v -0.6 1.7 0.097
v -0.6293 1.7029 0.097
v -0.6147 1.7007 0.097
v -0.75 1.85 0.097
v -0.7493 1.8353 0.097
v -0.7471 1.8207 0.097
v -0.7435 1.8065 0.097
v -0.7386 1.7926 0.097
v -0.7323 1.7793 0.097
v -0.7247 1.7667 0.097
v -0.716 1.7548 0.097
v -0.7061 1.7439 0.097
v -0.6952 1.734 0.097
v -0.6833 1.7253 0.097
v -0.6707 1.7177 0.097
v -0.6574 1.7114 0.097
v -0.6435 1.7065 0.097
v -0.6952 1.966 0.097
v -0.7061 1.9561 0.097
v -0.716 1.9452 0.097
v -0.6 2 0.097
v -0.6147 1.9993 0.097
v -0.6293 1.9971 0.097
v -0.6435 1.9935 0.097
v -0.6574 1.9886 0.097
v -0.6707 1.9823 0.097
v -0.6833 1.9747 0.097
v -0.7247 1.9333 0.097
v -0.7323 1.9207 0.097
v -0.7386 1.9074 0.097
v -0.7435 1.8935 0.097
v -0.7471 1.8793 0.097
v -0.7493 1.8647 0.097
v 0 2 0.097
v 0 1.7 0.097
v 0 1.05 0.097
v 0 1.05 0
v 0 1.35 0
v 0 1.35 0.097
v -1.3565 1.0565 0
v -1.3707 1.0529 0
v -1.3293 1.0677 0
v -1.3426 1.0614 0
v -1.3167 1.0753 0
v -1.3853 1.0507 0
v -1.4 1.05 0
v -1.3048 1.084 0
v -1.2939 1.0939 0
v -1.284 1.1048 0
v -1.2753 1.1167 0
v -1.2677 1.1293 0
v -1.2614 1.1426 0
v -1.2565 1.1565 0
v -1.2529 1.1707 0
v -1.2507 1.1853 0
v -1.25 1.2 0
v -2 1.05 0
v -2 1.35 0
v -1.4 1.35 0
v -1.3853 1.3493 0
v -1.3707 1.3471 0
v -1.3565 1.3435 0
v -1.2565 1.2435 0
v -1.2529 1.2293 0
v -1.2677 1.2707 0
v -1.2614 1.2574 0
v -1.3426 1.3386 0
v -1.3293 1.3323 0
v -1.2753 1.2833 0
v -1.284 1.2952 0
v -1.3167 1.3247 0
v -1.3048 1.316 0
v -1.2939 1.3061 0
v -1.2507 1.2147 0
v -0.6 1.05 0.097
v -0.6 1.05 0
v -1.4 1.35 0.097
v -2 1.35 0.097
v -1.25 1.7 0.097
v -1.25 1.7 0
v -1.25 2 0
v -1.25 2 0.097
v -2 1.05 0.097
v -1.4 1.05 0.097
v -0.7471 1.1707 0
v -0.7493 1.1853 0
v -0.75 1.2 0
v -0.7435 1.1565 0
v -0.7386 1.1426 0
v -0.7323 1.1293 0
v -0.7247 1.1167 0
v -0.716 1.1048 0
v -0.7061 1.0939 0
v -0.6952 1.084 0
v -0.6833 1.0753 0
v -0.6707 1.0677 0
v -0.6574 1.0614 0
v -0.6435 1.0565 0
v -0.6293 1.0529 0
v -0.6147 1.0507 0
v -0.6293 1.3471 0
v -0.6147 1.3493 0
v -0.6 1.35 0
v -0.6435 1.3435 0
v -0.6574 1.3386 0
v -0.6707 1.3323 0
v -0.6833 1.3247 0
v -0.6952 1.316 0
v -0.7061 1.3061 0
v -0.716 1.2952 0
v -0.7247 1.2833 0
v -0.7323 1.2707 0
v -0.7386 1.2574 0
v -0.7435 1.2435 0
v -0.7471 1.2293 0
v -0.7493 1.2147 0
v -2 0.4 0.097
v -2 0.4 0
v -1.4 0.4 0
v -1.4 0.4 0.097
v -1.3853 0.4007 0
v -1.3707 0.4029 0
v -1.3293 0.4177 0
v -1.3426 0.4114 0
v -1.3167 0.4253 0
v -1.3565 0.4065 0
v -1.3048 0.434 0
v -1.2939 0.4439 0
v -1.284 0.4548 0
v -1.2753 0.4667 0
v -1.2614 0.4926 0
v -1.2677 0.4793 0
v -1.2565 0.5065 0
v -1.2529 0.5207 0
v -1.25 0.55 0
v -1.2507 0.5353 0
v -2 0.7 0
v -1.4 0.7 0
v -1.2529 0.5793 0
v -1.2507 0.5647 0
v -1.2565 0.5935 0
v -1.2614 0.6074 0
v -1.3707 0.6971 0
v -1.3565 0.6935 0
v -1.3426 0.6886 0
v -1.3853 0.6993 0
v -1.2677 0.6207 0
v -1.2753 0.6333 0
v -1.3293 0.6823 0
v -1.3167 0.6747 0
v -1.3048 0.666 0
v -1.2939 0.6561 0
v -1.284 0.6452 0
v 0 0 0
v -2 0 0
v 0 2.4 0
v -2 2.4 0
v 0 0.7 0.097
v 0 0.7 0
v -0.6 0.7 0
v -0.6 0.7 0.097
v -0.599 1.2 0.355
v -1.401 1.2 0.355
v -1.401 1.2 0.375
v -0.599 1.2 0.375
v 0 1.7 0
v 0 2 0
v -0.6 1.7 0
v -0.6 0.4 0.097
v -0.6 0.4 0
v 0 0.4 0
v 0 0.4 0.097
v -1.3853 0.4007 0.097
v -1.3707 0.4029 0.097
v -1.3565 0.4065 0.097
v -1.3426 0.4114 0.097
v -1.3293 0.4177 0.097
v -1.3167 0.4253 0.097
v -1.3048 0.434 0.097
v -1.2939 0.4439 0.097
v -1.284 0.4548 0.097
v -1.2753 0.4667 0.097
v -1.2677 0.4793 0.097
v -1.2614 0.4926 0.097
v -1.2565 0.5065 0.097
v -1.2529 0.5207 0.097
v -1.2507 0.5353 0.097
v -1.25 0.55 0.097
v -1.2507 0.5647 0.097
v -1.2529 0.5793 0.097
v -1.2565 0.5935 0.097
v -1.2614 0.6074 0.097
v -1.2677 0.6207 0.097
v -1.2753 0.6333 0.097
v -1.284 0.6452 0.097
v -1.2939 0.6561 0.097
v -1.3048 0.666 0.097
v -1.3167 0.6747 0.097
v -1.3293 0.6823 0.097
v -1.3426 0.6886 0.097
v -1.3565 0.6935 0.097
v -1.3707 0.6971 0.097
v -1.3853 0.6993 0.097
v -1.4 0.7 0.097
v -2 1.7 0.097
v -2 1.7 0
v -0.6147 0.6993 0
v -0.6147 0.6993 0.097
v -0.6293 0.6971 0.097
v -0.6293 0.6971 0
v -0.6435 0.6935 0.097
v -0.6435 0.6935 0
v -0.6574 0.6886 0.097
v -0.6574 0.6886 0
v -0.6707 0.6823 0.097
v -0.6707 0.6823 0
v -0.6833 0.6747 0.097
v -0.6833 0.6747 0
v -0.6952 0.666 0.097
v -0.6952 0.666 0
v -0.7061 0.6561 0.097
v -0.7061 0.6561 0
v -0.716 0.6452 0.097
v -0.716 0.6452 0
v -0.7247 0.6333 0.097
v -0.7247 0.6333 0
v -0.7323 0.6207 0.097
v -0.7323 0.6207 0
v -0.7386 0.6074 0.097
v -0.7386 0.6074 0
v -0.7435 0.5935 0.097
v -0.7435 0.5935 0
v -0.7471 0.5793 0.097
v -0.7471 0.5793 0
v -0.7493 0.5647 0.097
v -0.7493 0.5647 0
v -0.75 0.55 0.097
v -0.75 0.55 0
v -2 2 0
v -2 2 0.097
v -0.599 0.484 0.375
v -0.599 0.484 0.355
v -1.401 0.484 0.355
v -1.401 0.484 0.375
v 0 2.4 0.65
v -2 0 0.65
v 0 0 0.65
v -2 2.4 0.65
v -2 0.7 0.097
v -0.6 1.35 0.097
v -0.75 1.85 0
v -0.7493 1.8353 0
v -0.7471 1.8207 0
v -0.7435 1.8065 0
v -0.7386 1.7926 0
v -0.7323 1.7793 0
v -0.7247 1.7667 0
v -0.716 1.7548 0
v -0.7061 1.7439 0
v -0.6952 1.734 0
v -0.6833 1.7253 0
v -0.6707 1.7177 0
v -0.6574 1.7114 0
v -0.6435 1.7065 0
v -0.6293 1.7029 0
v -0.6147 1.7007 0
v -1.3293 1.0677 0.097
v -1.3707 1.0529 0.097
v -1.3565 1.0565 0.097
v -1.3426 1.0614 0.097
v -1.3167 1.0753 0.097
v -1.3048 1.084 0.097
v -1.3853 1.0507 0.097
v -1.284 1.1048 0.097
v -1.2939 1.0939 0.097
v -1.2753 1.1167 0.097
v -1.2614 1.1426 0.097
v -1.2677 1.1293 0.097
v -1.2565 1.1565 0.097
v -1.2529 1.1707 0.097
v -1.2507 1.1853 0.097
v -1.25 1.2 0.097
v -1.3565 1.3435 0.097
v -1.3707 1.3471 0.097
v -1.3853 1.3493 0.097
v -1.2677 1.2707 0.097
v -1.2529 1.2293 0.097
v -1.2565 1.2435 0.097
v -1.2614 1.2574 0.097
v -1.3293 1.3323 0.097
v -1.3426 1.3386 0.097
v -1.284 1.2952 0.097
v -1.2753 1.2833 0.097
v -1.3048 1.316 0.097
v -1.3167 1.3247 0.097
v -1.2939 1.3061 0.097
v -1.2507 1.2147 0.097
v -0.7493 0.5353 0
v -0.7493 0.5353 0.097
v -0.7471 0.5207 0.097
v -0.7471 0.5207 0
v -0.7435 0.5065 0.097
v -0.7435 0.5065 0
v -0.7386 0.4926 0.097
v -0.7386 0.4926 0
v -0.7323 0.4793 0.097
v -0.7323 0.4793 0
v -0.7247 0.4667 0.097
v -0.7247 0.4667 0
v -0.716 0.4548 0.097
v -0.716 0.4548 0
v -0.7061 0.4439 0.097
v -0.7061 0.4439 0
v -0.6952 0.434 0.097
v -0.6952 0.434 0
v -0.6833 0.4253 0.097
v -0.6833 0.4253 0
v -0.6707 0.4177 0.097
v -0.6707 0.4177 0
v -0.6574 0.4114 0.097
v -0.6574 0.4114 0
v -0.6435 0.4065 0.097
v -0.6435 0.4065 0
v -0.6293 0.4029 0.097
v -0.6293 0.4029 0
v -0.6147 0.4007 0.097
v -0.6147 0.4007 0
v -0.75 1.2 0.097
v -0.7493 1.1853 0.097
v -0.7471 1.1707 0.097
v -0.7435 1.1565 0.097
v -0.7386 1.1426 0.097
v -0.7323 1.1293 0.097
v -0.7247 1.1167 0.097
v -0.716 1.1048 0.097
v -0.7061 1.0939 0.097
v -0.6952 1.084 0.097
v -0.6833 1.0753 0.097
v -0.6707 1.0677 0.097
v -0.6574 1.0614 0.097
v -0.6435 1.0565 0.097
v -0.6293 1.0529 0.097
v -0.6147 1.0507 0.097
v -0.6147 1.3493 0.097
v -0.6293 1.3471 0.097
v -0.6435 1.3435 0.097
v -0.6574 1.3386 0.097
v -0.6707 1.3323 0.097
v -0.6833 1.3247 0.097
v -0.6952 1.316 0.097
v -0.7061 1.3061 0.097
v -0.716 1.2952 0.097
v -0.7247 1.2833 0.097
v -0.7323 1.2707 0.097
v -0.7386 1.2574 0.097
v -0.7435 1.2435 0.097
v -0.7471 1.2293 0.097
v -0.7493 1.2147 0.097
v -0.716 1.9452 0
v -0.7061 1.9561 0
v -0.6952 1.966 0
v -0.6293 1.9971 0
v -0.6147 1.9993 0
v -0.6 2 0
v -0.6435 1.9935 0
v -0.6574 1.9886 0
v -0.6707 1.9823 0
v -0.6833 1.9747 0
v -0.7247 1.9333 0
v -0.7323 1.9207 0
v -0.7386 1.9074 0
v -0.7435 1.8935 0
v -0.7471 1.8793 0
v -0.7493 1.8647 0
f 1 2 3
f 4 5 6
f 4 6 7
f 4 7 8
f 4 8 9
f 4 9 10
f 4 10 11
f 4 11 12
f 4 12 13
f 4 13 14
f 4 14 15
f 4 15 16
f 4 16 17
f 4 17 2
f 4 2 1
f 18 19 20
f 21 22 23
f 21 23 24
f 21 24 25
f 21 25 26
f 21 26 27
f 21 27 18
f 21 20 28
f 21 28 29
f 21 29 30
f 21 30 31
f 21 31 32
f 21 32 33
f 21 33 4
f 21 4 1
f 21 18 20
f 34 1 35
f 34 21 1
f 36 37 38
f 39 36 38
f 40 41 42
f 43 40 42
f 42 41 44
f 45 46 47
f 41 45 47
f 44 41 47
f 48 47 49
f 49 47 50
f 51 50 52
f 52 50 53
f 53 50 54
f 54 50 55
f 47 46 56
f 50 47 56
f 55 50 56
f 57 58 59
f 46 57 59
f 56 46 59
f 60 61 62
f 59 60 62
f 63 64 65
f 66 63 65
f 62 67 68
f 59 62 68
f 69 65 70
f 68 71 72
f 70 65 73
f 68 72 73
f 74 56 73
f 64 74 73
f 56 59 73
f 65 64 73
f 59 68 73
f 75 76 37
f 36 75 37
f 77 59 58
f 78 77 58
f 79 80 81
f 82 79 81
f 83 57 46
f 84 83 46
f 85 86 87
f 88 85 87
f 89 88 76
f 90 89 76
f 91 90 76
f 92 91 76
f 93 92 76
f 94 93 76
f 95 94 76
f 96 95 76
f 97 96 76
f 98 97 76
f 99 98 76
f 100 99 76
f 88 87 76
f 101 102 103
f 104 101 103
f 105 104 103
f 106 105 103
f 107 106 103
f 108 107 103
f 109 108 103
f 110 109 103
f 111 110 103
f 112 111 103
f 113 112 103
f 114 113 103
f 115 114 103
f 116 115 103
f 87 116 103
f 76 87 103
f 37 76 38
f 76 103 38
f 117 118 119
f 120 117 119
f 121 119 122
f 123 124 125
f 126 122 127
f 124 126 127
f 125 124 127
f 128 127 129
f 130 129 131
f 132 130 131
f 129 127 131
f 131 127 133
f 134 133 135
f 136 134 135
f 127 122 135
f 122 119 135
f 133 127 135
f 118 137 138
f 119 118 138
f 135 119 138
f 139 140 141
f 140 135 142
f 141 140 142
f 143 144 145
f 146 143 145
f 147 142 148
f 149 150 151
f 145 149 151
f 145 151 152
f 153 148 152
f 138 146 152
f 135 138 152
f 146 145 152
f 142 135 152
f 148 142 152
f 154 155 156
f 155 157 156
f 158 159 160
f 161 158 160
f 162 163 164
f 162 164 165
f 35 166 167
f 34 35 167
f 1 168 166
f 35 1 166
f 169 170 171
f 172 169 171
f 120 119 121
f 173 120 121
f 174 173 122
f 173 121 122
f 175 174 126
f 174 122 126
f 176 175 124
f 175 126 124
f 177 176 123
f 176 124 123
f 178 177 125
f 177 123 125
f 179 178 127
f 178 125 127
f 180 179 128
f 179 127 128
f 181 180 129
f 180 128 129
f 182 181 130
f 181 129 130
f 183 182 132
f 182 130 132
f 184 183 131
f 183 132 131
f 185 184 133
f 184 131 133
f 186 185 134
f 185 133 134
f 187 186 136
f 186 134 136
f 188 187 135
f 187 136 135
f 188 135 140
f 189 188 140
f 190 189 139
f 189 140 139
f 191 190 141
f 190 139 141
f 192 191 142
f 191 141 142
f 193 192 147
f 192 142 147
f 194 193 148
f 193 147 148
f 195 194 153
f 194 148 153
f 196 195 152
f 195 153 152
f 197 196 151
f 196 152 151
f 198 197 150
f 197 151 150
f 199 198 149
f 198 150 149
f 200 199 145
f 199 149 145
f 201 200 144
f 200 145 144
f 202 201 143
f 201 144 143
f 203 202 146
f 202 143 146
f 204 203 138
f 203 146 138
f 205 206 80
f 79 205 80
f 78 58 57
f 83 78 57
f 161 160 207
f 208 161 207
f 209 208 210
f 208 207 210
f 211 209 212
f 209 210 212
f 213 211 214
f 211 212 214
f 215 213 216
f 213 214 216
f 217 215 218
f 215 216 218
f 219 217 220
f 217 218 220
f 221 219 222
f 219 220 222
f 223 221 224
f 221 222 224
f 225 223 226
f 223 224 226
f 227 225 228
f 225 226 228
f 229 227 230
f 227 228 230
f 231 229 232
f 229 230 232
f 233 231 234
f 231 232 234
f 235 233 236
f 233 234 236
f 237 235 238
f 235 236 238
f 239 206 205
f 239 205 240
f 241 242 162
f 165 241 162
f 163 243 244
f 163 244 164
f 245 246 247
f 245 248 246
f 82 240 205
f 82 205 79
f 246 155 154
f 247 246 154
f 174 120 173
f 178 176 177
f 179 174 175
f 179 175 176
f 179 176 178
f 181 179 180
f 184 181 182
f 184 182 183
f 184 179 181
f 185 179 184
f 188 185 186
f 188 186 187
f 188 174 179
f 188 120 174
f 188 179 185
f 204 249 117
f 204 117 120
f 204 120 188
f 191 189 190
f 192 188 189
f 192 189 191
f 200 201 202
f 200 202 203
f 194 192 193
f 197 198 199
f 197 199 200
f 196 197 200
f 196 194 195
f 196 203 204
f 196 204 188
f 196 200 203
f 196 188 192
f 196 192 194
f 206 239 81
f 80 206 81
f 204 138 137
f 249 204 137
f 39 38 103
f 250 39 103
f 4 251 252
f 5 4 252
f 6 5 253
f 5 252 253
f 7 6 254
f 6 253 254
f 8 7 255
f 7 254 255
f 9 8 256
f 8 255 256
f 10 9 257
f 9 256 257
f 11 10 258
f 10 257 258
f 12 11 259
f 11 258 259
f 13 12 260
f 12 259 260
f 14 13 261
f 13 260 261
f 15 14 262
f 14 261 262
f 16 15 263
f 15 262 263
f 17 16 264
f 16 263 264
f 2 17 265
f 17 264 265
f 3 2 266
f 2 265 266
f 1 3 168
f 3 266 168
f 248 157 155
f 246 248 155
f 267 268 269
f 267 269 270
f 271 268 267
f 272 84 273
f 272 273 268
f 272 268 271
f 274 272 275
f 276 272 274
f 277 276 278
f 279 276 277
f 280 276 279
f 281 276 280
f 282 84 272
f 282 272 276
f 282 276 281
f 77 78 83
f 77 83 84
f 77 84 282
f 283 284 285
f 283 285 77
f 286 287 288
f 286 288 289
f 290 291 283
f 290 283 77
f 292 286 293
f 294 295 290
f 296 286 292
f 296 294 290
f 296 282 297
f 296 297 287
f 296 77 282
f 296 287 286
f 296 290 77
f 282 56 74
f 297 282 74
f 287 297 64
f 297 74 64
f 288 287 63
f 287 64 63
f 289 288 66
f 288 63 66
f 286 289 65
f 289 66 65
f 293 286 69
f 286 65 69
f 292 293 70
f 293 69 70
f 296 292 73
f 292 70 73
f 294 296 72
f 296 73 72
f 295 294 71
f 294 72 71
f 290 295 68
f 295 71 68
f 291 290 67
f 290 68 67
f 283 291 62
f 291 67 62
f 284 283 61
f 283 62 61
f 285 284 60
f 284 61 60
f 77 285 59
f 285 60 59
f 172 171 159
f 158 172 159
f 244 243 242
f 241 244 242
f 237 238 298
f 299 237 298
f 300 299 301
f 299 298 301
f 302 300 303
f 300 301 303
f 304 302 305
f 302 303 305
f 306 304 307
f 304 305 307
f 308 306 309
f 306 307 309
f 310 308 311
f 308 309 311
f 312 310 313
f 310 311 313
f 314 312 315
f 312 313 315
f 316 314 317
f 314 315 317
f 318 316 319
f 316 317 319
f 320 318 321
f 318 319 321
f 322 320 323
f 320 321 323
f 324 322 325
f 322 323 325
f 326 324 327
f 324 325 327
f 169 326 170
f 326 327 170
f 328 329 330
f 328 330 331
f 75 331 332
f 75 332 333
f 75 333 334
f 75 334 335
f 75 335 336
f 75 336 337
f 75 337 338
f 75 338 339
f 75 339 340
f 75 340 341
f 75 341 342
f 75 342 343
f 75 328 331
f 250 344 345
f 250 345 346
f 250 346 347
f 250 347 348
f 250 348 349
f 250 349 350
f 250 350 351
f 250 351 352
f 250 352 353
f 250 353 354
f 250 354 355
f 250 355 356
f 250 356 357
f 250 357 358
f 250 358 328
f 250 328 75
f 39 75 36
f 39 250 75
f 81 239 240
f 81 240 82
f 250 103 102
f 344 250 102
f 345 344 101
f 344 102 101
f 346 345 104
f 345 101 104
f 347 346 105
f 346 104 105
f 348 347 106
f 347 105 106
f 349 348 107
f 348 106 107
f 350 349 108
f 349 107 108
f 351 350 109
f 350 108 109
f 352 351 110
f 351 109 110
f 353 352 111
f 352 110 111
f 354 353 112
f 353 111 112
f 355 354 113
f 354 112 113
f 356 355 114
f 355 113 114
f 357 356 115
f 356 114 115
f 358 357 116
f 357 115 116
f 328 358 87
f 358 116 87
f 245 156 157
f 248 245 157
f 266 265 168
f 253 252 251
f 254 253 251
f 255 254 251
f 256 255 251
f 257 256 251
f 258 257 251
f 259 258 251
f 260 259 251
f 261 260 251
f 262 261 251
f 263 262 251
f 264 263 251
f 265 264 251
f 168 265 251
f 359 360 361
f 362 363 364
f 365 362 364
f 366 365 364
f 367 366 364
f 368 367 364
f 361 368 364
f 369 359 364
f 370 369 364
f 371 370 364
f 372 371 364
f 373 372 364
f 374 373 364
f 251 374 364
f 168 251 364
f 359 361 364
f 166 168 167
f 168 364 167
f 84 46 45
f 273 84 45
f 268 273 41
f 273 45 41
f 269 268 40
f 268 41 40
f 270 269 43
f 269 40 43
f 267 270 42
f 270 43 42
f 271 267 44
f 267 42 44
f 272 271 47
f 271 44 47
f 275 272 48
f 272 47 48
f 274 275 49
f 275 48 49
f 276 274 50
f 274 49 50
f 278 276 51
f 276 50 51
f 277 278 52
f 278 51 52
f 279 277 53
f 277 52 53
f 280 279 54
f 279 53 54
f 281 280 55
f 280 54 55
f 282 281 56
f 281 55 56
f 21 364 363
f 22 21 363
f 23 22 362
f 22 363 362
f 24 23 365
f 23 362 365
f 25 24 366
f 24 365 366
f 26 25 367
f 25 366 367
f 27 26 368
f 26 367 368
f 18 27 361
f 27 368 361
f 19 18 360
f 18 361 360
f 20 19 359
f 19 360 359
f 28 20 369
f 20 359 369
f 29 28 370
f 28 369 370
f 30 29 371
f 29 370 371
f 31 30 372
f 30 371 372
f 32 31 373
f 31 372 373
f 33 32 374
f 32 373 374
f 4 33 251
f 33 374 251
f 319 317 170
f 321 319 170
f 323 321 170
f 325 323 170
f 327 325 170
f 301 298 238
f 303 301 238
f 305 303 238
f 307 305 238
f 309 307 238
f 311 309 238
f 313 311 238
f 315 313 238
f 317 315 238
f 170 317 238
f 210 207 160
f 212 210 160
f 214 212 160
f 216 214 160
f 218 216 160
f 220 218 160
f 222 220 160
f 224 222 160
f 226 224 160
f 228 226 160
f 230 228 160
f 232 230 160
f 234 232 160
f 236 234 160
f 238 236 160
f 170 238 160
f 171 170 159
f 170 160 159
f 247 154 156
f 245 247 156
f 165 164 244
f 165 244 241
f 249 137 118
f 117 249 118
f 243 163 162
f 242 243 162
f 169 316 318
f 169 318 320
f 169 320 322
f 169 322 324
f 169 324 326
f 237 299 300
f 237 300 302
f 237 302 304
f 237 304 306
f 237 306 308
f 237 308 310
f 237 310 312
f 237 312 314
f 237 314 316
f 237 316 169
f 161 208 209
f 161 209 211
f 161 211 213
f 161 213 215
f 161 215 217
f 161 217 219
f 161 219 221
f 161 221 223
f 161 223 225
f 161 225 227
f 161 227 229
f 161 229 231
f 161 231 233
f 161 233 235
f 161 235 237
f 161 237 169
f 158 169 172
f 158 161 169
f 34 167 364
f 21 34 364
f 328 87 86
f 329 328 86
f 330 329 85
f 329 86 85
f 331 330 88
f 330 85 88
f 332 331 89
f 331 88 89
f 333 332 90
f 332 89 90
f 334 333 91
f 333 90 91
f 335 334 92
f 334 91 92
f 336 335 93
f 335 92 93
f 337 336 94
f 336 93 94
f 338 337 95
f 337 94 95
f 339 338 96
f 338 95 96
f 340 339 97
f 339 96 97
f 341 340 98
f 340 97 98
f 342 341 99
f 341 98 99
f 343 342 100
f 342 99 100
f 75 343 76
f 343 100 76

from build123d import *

# Parameters (mm, degrees)
F0_W     = 0.75
F0_H     = 0.3
F1_DEPTH = 0.65
F2_DEPTH = 0.097
F4_W     = 0.802
F4_H     = 0.716
F5_DEPTH = 0.02


with BuildPart() as f1:
    # F0 (on Top) → F1 (new body)
    with BuildSketch(Plane.XY):
        with BuildLine():
            Line((-2, 0), (0, 0))
            Line((0, 0), (0, 0.4))
            Line((0, 0.4), (-0.6, 0.4))
            ThreePointArc((-0.6, 0.4), (-0.7060660172, 0.4439339828), (-0.75, 0.55))
            ThreePointArc((-0.75, 0.55), (-0.7060660172, 0.6560660172), (-0.6, 0.7))
            Line((-0.6, 0.7), (0, 0.7))
            Line((0, 0.7), (0, 1.05))
            Line((0, 1.05), (-0.6, 1.05))
            ThreePointArc((-0.6, 1.05), (-0.7060660172, 1.0939339828), (-0.75, 1.2))
            ThreePointArc((-0.75, 1.2), (-0.7060660172, 1.3060660172), (-0.6, 1.35))
            Line((-0.6, 1.35), (0, 1.35))
            Line((0, 1.35), (0, 1.7))
            Line((0, 1.7), (-0.6, 1.7))
            ThreePointArc((-0.6, 1.7), (-0.7060660172, 1.7439339828), (-0.75, 1.85))
            ThreePointArc((-0.75, 1.85), (-0.7060660172, 1.9560660172), (-0.6, 2))
            Line((-0.6, 2), (0, 2))
            Line((0, 2), (0, 2.4))
            Line((0, 2.4), (-2, 2.4))
            Line((-2, 2.4), (-2, 2))
            Line((-2, 2), (-1.25, 2))
            Line((-1.25, 2), (-1.25, 1.7))
            Line((-1.25, 1.7), (-2, 1.7))
            Line((-2, 1.7), (-2, 1.35))
            Line((-2, 1.35), (-1.4, 1.35))
            ThreePointArc((-1.4, 1.35), (-1.2939339828, 1.3060660172), (-1.25, 1.2))
            ThreePointArc((-1.25, 1.2), (-1.2939339828, 1.0939339828), (-1.4, 1.05))
            Line((-1.4, 1.05), (-2, 1.05))
            Line((-2, 1.05), (-2, 0.7))
            Line((-2, 0.7), (-1.4, 0.7))
            ThreePointArc((-1.4, 0.7), (-1.2939339828, 0.6560660172), (-1.25, 0.55))
            ThreePointArc((-1.25, 0.55), (-1.2939339828, 0.4439339828), (-1.4, 0.4))
            Line((-1.4, 0.4), (-2, 0.4))
            Line((-2, 0.4), (-2, 0))
        make_face()
        with Locations((-1.625, 1.85)):
            Rectangle(F0_W, F0_H)
        with BuildLine():
            Line((-2, 1.35), (-2, 1.05))
            Line((-2, 1.05), (-1.4, 1.05))
            ThreePointArc((-1.4, 1.05), (-1.2939339828, 1.0939339828), (-1.25, 1.2))
            ThreePointArc((-1.25, 1.2), (-1.2939339828, 1.3060660172), (-1.4, 1.35))
            Line((-1.4, 1.35), (-2, 1.35))
        make_face()
        with BuildLine():
            Line((-2, 0.7), (-2, 0.4))
            Line((-2, 0.4), (-1.4, 0.4))
            ThreePointArc((-1.4, 0.4), (-1.2939339828, 0.4439339828), (-1.25, 0.55))
            ThreePointArc((-1.25, 0.55), (-1.2939339828, 0.6560660172), (-1.4, 0.7))
            Line((-1.4, 0.7), (-2, 0.7))
        make_face()
        with BuildLine():
            Line((-0.6, 0.4), (0, 0.4))
            Line((0, 0.4), (0, 0.7))
            Line((0, 0.7), (-0.6, 0.7))
            ThreePointArc((-0.6, 0.7), (-0.7060660172, 0.6560660172), (-0.75, 0.55))
            ThreePointArc((-0.75, 0.55), (-0.7060660172, 0.4439339828), (-0.6, 0.4))
        make_face()
        with BuildLine():
            Line((-0.6, 1.05), (0, 1.05))
            Line((0, 1.05), (0, 1.35))
            Line((0, 1.35), (-0.6, 1.35))
            ThreePointArc((-0.6, 1.35), (-0.7060660172, 1.3060660172), (-0.75, 1.2))
            ThreePointArc((-0.75, 1.2), (-0.7060660172, 1.0939339828), (-0.6, 1.05))
        make_face()
        with BuildLine():
            Line((-0.6, 1.7), (0, 1.7))
            Line((0, 1.7), (0, 2))
            Line((0, 2), (-0.6, 2))
            ThreePointArc((-0.6, 2), (-0.7060660172, 1.9560660172), (-0.75, 1.85))
            ThreePointArc((-0.75, 1.85), (-0.7060660172, 1.7439339828), (-0.6, 1.7))
        make_face()
    extrude(amount=F1_DEPTH)


with BuildPart() as f2:
    # F0 (on Top) → F2 (new body)
    with BuildSketch(Plane.XY):
        with BuildLine():
            Line((-0.6, 1.7), (0, 1.7))
            Line((0, 1.7), (0, 2))
            Line((0, 2), (-0.6, 2))
            ThreePointArc((-0.6, 2), (-0.7060660172, 1.9560660172), (-0.75, 1.85))
            ThreePointArc((-0.75, 1.85), (-0.7060660172, 1.7439339828), (-0.6, 1.7))
        make_face()
    extrude(amount=F2_DEPTH)


with BuildPart() as f2b:
    # F0 (on Top) → F2, piece 2 (new body)
    with BuildSketch(Plane.XY):
        with Locations((-1.625, 1.85)):
            Rectangle(F0_W, F0_H)
    extrude(amount=F2_DEPTH)


with BuildPart() as f2c:
    # F0 (on Top) → F2, piece 3 (new body)
    with BuildSketch(Plane.XY):
        with BuildLine():
            Line((-0.6, 1.05), (0, 1.05))
            Line((0, 1.05), (0, 1.35))
            Line((0, 1.35), (-0.6, 1.35))
            ThreePointArc((-0.6, 1.35), (-0.7060660172, 1.3060660172), (-0.75, 1.2))
            ThreePointArc((-0.75, 1.2), (-0.7060660172, 1.0939339828), (-0.6, 1.05))
        make_face()
    extrude(amount=F2_DEPTH)


with BuildPart() as f2d:
    # F0 (on Top) → F2, piece 4 (new body)
    with BuildSketch(Plane.XY):
        with BuildLine():
            Line((-0.6, 0.4), (0, 0.4))
            Line((0, 0.4), (0, 0.7))
            Line((0, 0.7), (-0.6, 0.7))
            ThreePointArc((-0.6, 0.7), (-0.7060660172, 0.6560660172), (-0.75, 0.55))
            ThreePointArc((-0.75, 0.55), (-0.7060660172, 0.4439339828), (-0.6, 0.4))
        make_face()
    extrude(amount=F2_DEPTH)


with BuildPart() as f2e:
    # F0 (on Top) → F2, piece 5 (new body)
    with BuildSketch(Plane.XY):
        with BuildLine():
            Line((-2, 1.35), (-2, 1.05))
            Line((-2, 1.05), (-1.4, 1.05))
            ThreePointArc((-1.4, 1.05), (-1.2939339828, 1.0939339828), (-1.25, 1.2))
            ThreePointArc((-1.25, 1.2), (-1.2939339828, 1.3060660172), (-1.4, 1.35))
            Line((-1.4, 1.35), (-2, 1.35))
        make_face()
    extrude(amount=F2_DEPTH)


with BuildPart() as f2f:
    # F0 (on Top) → F2, piece 6 (new body)
    with BuildSketch(Plane.XY):
        with BuildLine():
            Line((-2, 0.7), (-2, 0.4))
            Line((-2, 0.4), (-1.4, 0.4))
            ThreePointArc((-1.4, 0.4), (-1.2939339828, 0.4439339828), (-1.25, 0.55))
            ThreePointArc((-1.25, 0.55), (-1.2939339828, 0.6560660172), (-1.4, 0.7))
            Line((-1.4, 0.7), (-2, 0.7))
        make_face()
    extrude(amount=F2_DEPTH)


with BuildPart() as f5:
    # F4 (on offset) → F5 (new body)
    with BuildSketch(Plane.XY.offset(0.355)):
        with Locations((-1, 0.842)):
            Rectangle(F4_W, F4_H)
    extrude(amount=F5_DEPTH)


solid = Compound([f1.part, f2.part, f2b.part, f2c.part, f2d.part, f2e.part, f2f.part, f5.part])
